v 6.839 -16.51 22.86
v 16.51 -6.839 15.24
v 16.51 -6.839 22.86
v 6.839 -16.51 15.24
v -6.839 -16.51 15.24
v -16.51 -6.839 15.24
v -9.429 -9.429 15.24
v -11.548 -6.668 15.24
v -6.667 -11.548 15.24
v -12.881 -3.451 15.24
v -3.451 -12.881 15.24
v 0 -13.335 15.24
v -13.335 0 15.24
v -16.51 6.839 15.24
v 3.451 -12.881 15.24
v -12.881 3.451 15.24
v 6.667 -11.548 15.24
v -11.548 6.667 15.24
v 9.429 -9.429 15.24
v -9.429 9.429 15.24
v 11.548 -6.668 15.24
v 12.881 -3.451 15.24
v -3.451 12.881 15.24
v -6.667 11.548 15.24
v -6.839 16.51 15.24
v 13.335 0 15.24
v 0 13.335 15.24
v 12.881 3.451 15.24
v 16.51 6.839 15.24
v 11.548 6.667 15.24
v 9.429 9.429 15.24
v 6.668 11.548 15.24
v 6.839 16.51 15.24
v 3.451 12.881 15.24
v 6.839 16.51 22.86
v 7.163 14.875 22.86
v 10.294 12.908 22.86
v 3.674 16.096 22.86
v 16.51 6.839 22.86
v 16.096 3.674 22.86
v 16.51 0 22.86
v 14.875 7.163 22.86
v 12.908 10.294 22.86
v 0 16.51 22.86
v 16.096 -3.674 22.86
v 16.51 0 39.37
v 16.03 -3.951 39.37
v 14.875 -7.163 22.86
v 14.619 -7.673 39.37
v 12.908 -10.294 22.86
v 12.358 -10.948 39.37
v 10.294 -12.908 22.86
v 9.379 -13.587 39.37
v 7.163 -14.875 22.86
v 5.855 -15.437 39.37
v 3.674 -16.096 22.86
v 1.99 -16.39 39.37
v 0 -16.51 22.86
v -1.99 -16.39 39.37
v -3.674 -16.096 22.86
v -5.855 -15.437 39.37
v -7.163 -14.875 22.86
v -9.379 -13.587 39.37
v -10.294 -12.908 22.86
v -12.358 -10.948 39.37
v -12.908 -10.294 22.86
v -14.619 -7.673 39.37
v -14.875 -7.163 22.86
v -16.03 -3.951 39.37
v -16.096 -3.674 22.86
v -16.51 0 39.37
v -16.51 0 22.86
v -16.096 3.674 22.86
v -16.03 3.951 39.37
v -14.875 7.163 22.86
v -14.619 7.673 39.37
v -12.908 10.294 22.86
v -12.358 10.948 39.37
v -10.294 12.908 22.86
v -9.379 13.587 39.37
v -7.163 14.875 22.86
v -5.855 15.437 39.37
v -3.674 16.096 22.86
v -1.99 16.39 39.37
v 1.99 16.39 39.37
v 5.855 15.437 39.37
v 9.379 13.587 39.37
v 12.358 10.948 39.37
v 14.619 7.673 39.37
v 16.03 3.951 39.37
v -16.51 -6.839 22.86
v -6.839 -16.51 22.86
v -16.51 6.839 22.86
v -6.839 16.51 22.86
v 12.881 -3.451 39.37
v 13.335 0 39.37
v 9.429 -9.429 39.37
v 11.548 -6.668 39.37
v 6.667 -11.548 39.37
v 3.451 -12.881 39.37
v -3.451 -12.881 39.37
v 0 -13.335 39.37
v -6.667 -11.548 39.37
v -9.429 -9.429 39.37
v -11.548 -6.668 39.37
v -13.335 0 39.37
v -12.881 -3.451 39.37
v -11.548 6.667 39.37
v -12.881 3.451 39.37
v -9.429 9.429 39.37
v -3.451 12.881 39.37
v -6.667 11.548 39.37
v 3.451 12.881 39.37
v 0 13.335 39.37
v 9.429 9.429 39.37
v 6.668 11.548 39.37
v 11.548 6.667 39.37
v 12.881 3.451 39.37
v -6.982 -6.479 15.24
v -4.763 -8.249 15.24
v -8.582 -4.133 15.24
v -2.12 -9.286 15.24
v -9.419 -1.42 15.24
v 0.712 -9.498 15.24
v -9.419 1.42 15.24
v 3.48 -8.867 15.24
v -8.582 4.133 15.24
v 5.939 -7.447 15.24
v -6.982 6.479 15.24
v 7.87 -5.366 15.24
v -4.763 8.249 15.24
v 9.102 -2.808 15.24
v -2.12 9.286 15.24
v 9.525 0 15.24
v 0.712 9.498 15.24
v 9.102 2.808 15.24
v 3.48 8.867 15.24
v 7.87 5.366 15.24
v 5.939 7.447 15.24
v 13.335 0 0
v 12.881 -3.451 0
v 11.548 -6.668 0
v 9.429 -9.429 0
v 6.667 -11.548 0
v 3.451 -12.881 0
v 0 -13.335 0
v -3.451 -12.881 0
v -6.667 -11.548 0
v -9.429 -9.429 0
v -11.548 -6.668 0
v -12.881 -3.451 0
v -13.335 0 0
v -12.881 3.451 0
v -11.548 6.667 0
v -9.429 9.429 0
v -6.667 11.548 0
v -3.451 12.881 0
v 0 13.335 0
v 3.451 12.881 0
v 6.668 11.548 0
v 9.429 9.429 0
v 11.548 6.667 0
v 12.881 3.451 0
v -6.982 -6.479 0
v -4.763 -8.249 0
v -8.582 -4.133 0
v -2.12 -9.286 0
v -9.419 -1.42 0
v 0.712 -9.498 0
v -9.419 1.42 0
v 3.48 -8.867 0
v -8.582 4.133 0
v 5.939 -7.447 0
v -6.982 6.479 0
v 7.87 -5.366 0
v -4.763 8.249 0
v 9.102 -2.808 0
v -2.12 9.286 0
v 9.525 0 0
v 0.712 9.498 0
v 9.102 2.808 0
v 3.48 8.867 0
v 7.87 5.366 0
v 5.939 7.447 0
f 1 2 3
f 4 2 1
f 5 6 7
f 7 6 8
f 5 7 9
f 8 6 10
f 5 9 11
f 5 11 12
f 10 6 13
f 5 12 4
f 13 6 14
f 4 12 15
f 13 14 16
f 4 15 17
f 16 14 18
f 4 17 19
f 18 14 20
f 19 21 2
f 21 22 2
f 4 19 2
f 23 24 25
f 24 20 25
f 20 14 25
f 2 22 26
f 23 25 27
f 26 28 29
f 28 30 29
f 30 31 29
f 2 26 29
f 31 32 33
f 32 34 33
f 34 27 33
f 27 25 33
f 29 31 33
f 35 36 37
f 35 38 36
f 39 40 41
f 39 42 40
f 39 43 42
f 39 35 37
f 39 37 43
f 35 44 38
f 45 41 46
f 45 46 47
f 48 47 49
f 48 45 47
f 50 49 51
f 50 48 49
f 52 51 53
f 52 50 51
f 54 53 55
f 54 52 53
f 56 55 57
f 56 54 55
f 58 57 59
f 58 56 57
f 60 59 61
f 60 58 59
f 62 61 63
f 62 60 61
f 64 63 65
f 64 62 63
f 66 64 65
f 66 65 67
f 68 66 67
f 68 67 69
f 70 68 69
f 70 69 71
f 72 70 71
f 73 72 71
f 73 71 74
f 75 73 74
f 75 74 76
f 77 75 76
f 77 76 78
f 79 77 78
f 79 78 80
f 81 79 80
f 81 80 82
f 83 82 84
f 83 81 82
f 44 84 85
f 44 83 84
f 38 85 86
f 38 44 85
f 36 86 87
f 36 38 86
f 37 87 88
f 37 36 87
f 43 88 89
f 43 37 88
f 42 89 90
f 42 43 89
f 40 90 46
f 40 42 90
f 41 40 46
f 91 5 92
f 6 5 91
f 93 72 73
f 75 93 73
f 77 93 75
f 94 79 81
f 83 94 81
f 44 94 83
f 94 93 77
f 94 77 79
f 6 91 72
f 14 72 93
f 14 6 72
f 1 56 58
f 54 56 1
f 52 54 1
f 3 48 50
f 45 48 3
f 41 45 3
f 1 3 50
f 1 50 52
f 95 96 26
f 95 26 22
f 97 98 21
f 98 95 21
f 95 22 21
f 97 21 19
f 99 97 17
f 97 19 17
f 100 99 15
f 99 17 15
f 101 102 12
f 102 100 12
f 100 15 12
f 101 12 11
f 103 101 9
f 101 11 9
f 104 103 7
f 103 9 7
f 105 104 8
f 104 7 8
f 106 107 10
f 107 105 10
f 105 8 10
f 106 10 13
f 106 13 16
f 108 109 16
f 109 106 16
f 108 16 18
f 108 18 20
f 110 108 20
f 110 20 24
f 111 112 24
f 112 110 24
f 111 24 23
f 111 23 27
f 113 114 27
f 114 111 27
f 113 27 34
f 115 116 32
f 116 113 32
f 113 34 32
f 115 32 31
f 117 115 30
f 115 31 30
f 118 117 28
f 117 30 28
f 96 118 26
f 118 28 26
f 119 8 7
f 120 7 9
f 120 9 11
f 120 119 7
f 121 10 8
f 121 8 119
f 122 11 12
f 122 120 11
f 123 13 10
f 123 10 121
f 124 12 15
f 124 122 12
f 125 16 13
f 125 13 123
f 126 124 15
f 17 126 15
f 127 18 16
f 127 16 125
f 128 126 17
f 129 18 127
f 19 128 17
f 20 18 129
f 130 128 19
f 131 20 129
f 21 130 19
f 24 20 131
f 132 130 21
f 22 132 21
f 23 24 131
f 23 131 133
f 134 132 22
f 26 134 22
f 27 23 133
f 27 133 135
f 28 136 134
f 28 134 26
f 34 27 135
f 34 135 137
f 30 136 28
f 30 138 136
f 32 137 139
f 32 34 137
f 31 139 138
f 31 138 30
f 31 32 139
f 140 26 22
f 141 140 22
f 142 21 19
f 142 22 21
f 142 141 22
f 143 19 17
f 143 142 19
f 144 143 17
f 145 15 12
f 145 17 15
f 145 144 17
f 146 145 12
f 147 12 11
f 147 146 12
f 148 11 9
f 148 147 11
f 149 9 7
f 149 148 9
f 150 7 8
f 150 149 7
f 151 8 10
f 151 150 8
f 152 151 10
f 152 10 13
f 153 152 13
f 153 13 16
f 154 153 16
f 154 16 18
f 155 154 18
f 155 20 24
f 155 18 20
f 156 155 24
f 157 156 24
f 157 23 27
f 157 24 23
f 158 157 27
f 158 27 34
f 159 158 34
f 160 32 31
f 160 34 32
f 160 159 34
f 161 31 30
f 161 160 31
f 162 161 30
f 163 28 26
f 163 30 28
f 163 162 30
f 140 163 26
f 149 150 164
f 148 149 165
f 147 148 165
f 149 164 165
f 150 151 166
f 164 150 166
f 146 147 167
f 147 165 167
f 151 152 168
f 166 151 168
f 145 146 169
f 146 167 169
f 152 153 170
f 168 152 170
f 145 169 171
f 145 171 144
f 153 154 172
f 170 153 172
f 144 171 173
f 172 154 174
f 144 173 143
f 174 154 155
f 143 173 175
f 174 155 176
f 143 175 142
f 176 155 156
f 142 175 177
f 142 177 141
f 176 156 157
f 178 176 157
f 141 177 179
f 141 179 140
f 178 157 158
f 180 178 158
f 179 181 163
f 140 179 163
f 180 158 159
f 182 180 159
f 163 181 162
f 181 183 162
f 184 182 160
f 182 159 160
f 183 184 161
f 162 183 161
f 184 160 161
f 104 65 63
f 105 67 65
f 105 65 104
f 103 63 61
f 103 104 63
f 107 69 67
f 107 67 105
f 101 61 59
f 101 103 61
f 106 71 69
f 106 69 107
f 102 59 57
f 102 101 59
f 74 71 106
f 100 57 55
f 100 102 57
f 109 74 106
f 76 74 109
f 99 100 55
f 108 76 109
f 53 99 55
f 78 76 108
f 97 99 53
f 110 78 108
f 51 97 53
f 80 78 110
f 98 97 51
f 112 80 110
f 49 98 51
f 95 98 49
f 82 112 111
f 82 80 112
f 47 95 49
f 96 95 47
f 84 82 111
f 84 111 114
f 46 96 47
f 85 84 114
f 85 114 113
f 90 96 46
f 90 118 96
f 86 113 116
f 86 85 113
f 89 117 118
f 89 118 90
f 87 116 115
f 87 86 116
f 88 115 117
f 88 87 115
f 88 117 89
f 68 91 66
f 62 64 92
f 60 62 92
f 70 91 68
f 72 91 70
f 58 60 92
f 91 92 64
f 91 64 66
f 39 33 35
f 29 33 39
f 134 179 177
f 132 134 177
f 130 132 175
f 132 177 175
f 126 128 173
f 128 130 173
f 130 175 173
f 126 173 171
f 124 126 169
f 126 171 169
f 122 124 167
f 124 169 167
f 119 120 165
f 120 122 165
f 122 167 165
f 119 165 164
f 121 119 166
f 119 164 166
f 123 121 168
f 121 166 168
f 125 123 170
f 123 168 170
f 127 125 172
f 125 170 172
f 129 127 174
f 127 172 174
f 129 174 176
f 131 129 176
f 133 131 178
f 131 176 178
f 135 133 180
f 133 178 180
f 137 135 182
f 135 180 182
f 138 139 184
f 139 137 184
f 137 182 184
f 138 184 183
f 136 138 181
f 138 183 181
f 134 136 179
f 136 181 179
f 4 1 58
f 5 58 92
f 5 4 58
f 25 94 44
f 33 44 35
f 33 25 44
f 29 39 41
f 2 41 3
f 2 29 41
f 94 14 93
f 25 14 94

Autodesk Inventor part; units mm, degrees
ref_plane "YZ Plane" through (0, 0, 0) normal (1, 0, 0) x (0, 1, 0)
ref_plane "XZ Plane" through (0, 0, 0) normal (0, 1, 0) x (-1, 0, 0)
ref_plane "XY Plane" through (0, 0, 0) normal (0, 0, 1) x (1, 0, 0)
sketch "Sketch1" plane through (0, 0, 0) normal (0, 0, 1) x (1, 0, 0)
  circle A0 centre (0, 0) radius 13.335
  circle A1 centre (0, 0) radius 9.525
  dimension "d0" = 26.67
  dimension "d2" = 19.05
extrude "Extrusion1" add sketch "Sketch1" along normal blind 15.24
sketch "Sketch2" plane through (0, 0, 15.24) normal (0, 0, 1) x (1, 0, 0)
  circle A0 centre (0, 0) radius 13.335 projected
  line L0 (16.51, -6.8387) -> (6.8387, -16.51)
  line L1 (6.8387, -16.51) -> (-6.8387, -16.51)
  line L2 (-6.8387, -16.51) -> (-16.51, -6.8387)
  line L3 (-16.51, -6.8387) -> (-16.51, 6.8387)
  line L4 (-16.51, 6.8387) -> (-6.8387, 16.51)
  line L5 (-6.8387, 16.51) -> (6.8387, 16.51)
  line L6 (6.8387, 16.51) -> (16.51, 6.8387)
  line L7 (16.51, 6.8387) -> (16.51, -6.8387)
  dimension "d5" = 33.02
extrude "Extrusion2" add sketch "Sketch2" along normal blind 7.62
sketch "Sketch3" plane through (0, 0, 22.86) normal (0, 0, 1) x (1, 0, 0)
  circle A0 centre (0, 0) radius 13.335 projected
  circle A1 centre (0, 0) radius 16.51
  circle A2 centre (0, 0) radius 13.335
  dimension "d8" = 33.02
  dimension "d10" = 26.67
extrude "Extrusion3" add sketch "Sketch3" along normal blind 16.51
thread "Thread1" size "1 1/16-8 UNC" class "2A" standard "ANSI Unified Screw Threads" full length
properties part number "1 Thread to pipe" material "PVC-Piping"
